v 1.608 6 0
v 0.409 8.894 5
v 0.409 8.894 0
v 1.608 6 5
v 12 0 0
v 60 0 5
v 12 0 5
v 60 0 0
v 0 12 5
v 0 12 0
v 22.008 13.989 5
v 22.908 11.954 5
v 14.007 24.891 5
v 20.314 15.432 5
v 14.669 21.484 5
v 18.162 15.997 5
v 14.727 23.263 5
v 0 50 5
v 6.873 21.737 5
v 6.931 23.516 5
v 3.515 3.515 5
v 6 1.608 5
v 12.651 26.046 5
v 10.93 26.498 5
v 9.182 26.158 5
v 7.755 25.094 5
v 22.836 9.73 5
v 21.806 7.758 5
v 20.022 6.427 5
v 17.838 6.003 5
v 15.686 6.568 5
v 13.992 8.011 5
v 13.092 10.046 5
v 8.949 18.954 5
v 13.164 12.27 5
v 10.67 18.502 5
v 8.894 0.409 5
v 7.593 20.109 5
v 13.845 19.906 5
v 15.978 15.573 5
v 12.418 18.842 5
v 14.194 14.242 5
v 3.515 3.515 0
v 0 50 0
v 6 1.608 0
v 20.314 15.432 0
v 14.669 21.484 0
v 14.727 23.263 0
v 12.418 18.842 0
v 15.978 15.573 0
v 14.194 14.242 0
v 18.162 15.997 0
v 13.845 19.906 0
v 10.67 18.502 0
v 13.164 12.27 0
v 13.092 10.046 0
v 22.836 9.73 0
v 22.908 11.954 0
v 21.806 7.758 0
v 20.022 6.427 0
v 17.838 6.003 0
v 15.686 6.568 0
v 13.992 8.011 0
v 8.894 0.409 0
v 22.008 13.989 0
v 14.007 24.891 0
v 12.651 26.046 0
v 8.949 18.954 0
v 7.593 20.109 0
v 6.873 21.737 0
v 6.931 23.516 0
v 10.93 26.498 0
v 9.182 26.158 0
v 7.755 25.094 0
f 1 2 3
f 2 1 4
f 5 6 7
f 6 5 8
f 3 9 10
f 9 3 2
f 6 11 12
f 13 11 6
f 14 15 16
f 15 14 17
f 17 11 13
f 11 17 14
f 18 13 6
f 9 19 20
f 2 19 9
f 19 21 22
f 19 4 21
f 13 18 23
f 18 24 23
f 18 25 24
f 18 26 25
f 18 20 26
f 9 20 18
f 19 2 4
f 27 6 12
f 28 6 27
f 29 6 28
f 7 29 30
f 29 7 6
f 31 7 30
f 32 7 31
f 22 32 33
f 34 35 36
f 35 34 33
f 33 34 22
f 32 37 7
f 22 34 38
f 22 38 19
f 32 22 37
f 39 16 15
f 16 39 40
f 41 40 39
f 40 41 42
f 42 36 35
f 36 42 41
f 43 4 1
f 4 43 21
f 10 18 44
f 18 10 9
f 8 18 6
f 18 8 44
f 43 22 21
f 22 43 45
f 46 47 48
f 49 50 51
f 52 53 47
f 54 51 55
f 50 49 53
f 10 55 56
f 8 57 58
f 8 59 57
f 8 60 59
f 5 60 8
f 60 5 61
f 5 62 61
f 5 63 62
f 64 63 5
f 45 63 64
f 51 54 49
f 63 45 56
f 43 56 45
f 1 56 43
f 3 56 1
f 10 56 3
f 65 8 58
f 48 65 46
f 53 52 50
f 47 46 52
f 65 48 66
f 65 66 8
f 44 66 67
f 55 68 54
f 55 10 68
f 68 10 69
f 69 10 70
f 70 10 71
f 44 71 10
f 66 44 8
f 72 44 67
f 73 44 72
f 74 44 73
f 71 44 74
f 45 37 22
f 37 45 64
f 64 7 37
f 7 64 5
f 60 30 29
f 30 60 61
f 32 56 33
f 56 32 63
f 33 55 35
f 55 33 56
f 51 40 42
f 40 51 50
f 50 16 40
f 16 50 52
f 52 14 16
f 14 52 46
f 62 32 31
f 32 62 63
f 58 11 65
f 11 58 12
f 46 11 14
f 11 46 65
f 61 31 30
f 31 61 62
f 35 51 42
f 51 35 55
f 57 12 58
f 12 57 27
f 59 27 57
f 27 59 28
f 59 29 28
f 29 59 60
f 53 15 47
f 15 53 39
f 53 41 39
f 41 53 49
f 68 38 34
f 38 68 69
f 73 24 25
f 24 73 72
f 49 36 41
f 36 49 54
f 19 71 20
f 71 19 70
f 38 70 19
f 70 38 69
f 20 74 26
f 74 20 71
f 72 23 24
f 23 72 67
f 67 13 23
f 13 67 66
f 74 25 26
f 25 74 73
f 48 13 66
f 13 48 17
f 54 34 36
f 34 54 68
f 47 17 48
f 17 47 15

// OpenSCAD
$fn = 32;

// ----------------------------------------------------------------------
// Bracket plate: corner pad 60 x 50, fillet R12
// ----------------------------------------------------------------------

// --- parameters (mm) ---
hole_r = 4;               // bolt hole radius
plate_t = 5;              // plate thickness, Z (extrusion height)
leg_a = 60;               // base leg
leg_b = 50;               // height leg
fillet_r = 12;            // right-angle fillet radius

hole_d1 = 2 * hole_r + 2;
hole_d2 = 2 * hole_r;

profile = [[12, 0], [60, 0], [0, 50], [0, 12], [0.409, 8.894], [1.608, 6], [3.515, 3.515], [6, 1.608], [8.894, 0.409]];  // primary outline, 9 points, counter clockwise
void_1 = [[22.908, 11.954], [22.008, 13.989], [20.314, 15.432], [18.162, 15.997], [15.978, 15.573], [14.194, 14.242], [13.164, 12.27], [13.092, 10.046], [13.992, 8.011], [15.686, 6.568], [17.838, 6.003], [20.022, 6.427], [21.806, 7.758], [22.836, 9.73]];  // mount hole 1, 14 points
void_2 = [[14.727, 23.263], [14.007, 24.891], [12.651, 26.046], [10.93, 26.498], [9.182, 26.158], [7.755, 25.094], [6.931, 23.516], [6.873, 21.737], [7.593, 20.109], [8.949, 18.954], [10.67, 18.502], [12.418, 18.842], [13.845, 19.906], [14.669, 21.484]];  // mount hole 2, 14 points

// --- the one profile operation ---
difference() {
  linear_extrude(height = plate_t) polygon(points = profile);
  translate([0, 0, -1])
    linear_extrude(height = plate_t + 2) polygon(points = void_1);
  translate([0, 0, -1])
    linear_extrude(height = plate_t + 2) polygon(points = void_2);
}
